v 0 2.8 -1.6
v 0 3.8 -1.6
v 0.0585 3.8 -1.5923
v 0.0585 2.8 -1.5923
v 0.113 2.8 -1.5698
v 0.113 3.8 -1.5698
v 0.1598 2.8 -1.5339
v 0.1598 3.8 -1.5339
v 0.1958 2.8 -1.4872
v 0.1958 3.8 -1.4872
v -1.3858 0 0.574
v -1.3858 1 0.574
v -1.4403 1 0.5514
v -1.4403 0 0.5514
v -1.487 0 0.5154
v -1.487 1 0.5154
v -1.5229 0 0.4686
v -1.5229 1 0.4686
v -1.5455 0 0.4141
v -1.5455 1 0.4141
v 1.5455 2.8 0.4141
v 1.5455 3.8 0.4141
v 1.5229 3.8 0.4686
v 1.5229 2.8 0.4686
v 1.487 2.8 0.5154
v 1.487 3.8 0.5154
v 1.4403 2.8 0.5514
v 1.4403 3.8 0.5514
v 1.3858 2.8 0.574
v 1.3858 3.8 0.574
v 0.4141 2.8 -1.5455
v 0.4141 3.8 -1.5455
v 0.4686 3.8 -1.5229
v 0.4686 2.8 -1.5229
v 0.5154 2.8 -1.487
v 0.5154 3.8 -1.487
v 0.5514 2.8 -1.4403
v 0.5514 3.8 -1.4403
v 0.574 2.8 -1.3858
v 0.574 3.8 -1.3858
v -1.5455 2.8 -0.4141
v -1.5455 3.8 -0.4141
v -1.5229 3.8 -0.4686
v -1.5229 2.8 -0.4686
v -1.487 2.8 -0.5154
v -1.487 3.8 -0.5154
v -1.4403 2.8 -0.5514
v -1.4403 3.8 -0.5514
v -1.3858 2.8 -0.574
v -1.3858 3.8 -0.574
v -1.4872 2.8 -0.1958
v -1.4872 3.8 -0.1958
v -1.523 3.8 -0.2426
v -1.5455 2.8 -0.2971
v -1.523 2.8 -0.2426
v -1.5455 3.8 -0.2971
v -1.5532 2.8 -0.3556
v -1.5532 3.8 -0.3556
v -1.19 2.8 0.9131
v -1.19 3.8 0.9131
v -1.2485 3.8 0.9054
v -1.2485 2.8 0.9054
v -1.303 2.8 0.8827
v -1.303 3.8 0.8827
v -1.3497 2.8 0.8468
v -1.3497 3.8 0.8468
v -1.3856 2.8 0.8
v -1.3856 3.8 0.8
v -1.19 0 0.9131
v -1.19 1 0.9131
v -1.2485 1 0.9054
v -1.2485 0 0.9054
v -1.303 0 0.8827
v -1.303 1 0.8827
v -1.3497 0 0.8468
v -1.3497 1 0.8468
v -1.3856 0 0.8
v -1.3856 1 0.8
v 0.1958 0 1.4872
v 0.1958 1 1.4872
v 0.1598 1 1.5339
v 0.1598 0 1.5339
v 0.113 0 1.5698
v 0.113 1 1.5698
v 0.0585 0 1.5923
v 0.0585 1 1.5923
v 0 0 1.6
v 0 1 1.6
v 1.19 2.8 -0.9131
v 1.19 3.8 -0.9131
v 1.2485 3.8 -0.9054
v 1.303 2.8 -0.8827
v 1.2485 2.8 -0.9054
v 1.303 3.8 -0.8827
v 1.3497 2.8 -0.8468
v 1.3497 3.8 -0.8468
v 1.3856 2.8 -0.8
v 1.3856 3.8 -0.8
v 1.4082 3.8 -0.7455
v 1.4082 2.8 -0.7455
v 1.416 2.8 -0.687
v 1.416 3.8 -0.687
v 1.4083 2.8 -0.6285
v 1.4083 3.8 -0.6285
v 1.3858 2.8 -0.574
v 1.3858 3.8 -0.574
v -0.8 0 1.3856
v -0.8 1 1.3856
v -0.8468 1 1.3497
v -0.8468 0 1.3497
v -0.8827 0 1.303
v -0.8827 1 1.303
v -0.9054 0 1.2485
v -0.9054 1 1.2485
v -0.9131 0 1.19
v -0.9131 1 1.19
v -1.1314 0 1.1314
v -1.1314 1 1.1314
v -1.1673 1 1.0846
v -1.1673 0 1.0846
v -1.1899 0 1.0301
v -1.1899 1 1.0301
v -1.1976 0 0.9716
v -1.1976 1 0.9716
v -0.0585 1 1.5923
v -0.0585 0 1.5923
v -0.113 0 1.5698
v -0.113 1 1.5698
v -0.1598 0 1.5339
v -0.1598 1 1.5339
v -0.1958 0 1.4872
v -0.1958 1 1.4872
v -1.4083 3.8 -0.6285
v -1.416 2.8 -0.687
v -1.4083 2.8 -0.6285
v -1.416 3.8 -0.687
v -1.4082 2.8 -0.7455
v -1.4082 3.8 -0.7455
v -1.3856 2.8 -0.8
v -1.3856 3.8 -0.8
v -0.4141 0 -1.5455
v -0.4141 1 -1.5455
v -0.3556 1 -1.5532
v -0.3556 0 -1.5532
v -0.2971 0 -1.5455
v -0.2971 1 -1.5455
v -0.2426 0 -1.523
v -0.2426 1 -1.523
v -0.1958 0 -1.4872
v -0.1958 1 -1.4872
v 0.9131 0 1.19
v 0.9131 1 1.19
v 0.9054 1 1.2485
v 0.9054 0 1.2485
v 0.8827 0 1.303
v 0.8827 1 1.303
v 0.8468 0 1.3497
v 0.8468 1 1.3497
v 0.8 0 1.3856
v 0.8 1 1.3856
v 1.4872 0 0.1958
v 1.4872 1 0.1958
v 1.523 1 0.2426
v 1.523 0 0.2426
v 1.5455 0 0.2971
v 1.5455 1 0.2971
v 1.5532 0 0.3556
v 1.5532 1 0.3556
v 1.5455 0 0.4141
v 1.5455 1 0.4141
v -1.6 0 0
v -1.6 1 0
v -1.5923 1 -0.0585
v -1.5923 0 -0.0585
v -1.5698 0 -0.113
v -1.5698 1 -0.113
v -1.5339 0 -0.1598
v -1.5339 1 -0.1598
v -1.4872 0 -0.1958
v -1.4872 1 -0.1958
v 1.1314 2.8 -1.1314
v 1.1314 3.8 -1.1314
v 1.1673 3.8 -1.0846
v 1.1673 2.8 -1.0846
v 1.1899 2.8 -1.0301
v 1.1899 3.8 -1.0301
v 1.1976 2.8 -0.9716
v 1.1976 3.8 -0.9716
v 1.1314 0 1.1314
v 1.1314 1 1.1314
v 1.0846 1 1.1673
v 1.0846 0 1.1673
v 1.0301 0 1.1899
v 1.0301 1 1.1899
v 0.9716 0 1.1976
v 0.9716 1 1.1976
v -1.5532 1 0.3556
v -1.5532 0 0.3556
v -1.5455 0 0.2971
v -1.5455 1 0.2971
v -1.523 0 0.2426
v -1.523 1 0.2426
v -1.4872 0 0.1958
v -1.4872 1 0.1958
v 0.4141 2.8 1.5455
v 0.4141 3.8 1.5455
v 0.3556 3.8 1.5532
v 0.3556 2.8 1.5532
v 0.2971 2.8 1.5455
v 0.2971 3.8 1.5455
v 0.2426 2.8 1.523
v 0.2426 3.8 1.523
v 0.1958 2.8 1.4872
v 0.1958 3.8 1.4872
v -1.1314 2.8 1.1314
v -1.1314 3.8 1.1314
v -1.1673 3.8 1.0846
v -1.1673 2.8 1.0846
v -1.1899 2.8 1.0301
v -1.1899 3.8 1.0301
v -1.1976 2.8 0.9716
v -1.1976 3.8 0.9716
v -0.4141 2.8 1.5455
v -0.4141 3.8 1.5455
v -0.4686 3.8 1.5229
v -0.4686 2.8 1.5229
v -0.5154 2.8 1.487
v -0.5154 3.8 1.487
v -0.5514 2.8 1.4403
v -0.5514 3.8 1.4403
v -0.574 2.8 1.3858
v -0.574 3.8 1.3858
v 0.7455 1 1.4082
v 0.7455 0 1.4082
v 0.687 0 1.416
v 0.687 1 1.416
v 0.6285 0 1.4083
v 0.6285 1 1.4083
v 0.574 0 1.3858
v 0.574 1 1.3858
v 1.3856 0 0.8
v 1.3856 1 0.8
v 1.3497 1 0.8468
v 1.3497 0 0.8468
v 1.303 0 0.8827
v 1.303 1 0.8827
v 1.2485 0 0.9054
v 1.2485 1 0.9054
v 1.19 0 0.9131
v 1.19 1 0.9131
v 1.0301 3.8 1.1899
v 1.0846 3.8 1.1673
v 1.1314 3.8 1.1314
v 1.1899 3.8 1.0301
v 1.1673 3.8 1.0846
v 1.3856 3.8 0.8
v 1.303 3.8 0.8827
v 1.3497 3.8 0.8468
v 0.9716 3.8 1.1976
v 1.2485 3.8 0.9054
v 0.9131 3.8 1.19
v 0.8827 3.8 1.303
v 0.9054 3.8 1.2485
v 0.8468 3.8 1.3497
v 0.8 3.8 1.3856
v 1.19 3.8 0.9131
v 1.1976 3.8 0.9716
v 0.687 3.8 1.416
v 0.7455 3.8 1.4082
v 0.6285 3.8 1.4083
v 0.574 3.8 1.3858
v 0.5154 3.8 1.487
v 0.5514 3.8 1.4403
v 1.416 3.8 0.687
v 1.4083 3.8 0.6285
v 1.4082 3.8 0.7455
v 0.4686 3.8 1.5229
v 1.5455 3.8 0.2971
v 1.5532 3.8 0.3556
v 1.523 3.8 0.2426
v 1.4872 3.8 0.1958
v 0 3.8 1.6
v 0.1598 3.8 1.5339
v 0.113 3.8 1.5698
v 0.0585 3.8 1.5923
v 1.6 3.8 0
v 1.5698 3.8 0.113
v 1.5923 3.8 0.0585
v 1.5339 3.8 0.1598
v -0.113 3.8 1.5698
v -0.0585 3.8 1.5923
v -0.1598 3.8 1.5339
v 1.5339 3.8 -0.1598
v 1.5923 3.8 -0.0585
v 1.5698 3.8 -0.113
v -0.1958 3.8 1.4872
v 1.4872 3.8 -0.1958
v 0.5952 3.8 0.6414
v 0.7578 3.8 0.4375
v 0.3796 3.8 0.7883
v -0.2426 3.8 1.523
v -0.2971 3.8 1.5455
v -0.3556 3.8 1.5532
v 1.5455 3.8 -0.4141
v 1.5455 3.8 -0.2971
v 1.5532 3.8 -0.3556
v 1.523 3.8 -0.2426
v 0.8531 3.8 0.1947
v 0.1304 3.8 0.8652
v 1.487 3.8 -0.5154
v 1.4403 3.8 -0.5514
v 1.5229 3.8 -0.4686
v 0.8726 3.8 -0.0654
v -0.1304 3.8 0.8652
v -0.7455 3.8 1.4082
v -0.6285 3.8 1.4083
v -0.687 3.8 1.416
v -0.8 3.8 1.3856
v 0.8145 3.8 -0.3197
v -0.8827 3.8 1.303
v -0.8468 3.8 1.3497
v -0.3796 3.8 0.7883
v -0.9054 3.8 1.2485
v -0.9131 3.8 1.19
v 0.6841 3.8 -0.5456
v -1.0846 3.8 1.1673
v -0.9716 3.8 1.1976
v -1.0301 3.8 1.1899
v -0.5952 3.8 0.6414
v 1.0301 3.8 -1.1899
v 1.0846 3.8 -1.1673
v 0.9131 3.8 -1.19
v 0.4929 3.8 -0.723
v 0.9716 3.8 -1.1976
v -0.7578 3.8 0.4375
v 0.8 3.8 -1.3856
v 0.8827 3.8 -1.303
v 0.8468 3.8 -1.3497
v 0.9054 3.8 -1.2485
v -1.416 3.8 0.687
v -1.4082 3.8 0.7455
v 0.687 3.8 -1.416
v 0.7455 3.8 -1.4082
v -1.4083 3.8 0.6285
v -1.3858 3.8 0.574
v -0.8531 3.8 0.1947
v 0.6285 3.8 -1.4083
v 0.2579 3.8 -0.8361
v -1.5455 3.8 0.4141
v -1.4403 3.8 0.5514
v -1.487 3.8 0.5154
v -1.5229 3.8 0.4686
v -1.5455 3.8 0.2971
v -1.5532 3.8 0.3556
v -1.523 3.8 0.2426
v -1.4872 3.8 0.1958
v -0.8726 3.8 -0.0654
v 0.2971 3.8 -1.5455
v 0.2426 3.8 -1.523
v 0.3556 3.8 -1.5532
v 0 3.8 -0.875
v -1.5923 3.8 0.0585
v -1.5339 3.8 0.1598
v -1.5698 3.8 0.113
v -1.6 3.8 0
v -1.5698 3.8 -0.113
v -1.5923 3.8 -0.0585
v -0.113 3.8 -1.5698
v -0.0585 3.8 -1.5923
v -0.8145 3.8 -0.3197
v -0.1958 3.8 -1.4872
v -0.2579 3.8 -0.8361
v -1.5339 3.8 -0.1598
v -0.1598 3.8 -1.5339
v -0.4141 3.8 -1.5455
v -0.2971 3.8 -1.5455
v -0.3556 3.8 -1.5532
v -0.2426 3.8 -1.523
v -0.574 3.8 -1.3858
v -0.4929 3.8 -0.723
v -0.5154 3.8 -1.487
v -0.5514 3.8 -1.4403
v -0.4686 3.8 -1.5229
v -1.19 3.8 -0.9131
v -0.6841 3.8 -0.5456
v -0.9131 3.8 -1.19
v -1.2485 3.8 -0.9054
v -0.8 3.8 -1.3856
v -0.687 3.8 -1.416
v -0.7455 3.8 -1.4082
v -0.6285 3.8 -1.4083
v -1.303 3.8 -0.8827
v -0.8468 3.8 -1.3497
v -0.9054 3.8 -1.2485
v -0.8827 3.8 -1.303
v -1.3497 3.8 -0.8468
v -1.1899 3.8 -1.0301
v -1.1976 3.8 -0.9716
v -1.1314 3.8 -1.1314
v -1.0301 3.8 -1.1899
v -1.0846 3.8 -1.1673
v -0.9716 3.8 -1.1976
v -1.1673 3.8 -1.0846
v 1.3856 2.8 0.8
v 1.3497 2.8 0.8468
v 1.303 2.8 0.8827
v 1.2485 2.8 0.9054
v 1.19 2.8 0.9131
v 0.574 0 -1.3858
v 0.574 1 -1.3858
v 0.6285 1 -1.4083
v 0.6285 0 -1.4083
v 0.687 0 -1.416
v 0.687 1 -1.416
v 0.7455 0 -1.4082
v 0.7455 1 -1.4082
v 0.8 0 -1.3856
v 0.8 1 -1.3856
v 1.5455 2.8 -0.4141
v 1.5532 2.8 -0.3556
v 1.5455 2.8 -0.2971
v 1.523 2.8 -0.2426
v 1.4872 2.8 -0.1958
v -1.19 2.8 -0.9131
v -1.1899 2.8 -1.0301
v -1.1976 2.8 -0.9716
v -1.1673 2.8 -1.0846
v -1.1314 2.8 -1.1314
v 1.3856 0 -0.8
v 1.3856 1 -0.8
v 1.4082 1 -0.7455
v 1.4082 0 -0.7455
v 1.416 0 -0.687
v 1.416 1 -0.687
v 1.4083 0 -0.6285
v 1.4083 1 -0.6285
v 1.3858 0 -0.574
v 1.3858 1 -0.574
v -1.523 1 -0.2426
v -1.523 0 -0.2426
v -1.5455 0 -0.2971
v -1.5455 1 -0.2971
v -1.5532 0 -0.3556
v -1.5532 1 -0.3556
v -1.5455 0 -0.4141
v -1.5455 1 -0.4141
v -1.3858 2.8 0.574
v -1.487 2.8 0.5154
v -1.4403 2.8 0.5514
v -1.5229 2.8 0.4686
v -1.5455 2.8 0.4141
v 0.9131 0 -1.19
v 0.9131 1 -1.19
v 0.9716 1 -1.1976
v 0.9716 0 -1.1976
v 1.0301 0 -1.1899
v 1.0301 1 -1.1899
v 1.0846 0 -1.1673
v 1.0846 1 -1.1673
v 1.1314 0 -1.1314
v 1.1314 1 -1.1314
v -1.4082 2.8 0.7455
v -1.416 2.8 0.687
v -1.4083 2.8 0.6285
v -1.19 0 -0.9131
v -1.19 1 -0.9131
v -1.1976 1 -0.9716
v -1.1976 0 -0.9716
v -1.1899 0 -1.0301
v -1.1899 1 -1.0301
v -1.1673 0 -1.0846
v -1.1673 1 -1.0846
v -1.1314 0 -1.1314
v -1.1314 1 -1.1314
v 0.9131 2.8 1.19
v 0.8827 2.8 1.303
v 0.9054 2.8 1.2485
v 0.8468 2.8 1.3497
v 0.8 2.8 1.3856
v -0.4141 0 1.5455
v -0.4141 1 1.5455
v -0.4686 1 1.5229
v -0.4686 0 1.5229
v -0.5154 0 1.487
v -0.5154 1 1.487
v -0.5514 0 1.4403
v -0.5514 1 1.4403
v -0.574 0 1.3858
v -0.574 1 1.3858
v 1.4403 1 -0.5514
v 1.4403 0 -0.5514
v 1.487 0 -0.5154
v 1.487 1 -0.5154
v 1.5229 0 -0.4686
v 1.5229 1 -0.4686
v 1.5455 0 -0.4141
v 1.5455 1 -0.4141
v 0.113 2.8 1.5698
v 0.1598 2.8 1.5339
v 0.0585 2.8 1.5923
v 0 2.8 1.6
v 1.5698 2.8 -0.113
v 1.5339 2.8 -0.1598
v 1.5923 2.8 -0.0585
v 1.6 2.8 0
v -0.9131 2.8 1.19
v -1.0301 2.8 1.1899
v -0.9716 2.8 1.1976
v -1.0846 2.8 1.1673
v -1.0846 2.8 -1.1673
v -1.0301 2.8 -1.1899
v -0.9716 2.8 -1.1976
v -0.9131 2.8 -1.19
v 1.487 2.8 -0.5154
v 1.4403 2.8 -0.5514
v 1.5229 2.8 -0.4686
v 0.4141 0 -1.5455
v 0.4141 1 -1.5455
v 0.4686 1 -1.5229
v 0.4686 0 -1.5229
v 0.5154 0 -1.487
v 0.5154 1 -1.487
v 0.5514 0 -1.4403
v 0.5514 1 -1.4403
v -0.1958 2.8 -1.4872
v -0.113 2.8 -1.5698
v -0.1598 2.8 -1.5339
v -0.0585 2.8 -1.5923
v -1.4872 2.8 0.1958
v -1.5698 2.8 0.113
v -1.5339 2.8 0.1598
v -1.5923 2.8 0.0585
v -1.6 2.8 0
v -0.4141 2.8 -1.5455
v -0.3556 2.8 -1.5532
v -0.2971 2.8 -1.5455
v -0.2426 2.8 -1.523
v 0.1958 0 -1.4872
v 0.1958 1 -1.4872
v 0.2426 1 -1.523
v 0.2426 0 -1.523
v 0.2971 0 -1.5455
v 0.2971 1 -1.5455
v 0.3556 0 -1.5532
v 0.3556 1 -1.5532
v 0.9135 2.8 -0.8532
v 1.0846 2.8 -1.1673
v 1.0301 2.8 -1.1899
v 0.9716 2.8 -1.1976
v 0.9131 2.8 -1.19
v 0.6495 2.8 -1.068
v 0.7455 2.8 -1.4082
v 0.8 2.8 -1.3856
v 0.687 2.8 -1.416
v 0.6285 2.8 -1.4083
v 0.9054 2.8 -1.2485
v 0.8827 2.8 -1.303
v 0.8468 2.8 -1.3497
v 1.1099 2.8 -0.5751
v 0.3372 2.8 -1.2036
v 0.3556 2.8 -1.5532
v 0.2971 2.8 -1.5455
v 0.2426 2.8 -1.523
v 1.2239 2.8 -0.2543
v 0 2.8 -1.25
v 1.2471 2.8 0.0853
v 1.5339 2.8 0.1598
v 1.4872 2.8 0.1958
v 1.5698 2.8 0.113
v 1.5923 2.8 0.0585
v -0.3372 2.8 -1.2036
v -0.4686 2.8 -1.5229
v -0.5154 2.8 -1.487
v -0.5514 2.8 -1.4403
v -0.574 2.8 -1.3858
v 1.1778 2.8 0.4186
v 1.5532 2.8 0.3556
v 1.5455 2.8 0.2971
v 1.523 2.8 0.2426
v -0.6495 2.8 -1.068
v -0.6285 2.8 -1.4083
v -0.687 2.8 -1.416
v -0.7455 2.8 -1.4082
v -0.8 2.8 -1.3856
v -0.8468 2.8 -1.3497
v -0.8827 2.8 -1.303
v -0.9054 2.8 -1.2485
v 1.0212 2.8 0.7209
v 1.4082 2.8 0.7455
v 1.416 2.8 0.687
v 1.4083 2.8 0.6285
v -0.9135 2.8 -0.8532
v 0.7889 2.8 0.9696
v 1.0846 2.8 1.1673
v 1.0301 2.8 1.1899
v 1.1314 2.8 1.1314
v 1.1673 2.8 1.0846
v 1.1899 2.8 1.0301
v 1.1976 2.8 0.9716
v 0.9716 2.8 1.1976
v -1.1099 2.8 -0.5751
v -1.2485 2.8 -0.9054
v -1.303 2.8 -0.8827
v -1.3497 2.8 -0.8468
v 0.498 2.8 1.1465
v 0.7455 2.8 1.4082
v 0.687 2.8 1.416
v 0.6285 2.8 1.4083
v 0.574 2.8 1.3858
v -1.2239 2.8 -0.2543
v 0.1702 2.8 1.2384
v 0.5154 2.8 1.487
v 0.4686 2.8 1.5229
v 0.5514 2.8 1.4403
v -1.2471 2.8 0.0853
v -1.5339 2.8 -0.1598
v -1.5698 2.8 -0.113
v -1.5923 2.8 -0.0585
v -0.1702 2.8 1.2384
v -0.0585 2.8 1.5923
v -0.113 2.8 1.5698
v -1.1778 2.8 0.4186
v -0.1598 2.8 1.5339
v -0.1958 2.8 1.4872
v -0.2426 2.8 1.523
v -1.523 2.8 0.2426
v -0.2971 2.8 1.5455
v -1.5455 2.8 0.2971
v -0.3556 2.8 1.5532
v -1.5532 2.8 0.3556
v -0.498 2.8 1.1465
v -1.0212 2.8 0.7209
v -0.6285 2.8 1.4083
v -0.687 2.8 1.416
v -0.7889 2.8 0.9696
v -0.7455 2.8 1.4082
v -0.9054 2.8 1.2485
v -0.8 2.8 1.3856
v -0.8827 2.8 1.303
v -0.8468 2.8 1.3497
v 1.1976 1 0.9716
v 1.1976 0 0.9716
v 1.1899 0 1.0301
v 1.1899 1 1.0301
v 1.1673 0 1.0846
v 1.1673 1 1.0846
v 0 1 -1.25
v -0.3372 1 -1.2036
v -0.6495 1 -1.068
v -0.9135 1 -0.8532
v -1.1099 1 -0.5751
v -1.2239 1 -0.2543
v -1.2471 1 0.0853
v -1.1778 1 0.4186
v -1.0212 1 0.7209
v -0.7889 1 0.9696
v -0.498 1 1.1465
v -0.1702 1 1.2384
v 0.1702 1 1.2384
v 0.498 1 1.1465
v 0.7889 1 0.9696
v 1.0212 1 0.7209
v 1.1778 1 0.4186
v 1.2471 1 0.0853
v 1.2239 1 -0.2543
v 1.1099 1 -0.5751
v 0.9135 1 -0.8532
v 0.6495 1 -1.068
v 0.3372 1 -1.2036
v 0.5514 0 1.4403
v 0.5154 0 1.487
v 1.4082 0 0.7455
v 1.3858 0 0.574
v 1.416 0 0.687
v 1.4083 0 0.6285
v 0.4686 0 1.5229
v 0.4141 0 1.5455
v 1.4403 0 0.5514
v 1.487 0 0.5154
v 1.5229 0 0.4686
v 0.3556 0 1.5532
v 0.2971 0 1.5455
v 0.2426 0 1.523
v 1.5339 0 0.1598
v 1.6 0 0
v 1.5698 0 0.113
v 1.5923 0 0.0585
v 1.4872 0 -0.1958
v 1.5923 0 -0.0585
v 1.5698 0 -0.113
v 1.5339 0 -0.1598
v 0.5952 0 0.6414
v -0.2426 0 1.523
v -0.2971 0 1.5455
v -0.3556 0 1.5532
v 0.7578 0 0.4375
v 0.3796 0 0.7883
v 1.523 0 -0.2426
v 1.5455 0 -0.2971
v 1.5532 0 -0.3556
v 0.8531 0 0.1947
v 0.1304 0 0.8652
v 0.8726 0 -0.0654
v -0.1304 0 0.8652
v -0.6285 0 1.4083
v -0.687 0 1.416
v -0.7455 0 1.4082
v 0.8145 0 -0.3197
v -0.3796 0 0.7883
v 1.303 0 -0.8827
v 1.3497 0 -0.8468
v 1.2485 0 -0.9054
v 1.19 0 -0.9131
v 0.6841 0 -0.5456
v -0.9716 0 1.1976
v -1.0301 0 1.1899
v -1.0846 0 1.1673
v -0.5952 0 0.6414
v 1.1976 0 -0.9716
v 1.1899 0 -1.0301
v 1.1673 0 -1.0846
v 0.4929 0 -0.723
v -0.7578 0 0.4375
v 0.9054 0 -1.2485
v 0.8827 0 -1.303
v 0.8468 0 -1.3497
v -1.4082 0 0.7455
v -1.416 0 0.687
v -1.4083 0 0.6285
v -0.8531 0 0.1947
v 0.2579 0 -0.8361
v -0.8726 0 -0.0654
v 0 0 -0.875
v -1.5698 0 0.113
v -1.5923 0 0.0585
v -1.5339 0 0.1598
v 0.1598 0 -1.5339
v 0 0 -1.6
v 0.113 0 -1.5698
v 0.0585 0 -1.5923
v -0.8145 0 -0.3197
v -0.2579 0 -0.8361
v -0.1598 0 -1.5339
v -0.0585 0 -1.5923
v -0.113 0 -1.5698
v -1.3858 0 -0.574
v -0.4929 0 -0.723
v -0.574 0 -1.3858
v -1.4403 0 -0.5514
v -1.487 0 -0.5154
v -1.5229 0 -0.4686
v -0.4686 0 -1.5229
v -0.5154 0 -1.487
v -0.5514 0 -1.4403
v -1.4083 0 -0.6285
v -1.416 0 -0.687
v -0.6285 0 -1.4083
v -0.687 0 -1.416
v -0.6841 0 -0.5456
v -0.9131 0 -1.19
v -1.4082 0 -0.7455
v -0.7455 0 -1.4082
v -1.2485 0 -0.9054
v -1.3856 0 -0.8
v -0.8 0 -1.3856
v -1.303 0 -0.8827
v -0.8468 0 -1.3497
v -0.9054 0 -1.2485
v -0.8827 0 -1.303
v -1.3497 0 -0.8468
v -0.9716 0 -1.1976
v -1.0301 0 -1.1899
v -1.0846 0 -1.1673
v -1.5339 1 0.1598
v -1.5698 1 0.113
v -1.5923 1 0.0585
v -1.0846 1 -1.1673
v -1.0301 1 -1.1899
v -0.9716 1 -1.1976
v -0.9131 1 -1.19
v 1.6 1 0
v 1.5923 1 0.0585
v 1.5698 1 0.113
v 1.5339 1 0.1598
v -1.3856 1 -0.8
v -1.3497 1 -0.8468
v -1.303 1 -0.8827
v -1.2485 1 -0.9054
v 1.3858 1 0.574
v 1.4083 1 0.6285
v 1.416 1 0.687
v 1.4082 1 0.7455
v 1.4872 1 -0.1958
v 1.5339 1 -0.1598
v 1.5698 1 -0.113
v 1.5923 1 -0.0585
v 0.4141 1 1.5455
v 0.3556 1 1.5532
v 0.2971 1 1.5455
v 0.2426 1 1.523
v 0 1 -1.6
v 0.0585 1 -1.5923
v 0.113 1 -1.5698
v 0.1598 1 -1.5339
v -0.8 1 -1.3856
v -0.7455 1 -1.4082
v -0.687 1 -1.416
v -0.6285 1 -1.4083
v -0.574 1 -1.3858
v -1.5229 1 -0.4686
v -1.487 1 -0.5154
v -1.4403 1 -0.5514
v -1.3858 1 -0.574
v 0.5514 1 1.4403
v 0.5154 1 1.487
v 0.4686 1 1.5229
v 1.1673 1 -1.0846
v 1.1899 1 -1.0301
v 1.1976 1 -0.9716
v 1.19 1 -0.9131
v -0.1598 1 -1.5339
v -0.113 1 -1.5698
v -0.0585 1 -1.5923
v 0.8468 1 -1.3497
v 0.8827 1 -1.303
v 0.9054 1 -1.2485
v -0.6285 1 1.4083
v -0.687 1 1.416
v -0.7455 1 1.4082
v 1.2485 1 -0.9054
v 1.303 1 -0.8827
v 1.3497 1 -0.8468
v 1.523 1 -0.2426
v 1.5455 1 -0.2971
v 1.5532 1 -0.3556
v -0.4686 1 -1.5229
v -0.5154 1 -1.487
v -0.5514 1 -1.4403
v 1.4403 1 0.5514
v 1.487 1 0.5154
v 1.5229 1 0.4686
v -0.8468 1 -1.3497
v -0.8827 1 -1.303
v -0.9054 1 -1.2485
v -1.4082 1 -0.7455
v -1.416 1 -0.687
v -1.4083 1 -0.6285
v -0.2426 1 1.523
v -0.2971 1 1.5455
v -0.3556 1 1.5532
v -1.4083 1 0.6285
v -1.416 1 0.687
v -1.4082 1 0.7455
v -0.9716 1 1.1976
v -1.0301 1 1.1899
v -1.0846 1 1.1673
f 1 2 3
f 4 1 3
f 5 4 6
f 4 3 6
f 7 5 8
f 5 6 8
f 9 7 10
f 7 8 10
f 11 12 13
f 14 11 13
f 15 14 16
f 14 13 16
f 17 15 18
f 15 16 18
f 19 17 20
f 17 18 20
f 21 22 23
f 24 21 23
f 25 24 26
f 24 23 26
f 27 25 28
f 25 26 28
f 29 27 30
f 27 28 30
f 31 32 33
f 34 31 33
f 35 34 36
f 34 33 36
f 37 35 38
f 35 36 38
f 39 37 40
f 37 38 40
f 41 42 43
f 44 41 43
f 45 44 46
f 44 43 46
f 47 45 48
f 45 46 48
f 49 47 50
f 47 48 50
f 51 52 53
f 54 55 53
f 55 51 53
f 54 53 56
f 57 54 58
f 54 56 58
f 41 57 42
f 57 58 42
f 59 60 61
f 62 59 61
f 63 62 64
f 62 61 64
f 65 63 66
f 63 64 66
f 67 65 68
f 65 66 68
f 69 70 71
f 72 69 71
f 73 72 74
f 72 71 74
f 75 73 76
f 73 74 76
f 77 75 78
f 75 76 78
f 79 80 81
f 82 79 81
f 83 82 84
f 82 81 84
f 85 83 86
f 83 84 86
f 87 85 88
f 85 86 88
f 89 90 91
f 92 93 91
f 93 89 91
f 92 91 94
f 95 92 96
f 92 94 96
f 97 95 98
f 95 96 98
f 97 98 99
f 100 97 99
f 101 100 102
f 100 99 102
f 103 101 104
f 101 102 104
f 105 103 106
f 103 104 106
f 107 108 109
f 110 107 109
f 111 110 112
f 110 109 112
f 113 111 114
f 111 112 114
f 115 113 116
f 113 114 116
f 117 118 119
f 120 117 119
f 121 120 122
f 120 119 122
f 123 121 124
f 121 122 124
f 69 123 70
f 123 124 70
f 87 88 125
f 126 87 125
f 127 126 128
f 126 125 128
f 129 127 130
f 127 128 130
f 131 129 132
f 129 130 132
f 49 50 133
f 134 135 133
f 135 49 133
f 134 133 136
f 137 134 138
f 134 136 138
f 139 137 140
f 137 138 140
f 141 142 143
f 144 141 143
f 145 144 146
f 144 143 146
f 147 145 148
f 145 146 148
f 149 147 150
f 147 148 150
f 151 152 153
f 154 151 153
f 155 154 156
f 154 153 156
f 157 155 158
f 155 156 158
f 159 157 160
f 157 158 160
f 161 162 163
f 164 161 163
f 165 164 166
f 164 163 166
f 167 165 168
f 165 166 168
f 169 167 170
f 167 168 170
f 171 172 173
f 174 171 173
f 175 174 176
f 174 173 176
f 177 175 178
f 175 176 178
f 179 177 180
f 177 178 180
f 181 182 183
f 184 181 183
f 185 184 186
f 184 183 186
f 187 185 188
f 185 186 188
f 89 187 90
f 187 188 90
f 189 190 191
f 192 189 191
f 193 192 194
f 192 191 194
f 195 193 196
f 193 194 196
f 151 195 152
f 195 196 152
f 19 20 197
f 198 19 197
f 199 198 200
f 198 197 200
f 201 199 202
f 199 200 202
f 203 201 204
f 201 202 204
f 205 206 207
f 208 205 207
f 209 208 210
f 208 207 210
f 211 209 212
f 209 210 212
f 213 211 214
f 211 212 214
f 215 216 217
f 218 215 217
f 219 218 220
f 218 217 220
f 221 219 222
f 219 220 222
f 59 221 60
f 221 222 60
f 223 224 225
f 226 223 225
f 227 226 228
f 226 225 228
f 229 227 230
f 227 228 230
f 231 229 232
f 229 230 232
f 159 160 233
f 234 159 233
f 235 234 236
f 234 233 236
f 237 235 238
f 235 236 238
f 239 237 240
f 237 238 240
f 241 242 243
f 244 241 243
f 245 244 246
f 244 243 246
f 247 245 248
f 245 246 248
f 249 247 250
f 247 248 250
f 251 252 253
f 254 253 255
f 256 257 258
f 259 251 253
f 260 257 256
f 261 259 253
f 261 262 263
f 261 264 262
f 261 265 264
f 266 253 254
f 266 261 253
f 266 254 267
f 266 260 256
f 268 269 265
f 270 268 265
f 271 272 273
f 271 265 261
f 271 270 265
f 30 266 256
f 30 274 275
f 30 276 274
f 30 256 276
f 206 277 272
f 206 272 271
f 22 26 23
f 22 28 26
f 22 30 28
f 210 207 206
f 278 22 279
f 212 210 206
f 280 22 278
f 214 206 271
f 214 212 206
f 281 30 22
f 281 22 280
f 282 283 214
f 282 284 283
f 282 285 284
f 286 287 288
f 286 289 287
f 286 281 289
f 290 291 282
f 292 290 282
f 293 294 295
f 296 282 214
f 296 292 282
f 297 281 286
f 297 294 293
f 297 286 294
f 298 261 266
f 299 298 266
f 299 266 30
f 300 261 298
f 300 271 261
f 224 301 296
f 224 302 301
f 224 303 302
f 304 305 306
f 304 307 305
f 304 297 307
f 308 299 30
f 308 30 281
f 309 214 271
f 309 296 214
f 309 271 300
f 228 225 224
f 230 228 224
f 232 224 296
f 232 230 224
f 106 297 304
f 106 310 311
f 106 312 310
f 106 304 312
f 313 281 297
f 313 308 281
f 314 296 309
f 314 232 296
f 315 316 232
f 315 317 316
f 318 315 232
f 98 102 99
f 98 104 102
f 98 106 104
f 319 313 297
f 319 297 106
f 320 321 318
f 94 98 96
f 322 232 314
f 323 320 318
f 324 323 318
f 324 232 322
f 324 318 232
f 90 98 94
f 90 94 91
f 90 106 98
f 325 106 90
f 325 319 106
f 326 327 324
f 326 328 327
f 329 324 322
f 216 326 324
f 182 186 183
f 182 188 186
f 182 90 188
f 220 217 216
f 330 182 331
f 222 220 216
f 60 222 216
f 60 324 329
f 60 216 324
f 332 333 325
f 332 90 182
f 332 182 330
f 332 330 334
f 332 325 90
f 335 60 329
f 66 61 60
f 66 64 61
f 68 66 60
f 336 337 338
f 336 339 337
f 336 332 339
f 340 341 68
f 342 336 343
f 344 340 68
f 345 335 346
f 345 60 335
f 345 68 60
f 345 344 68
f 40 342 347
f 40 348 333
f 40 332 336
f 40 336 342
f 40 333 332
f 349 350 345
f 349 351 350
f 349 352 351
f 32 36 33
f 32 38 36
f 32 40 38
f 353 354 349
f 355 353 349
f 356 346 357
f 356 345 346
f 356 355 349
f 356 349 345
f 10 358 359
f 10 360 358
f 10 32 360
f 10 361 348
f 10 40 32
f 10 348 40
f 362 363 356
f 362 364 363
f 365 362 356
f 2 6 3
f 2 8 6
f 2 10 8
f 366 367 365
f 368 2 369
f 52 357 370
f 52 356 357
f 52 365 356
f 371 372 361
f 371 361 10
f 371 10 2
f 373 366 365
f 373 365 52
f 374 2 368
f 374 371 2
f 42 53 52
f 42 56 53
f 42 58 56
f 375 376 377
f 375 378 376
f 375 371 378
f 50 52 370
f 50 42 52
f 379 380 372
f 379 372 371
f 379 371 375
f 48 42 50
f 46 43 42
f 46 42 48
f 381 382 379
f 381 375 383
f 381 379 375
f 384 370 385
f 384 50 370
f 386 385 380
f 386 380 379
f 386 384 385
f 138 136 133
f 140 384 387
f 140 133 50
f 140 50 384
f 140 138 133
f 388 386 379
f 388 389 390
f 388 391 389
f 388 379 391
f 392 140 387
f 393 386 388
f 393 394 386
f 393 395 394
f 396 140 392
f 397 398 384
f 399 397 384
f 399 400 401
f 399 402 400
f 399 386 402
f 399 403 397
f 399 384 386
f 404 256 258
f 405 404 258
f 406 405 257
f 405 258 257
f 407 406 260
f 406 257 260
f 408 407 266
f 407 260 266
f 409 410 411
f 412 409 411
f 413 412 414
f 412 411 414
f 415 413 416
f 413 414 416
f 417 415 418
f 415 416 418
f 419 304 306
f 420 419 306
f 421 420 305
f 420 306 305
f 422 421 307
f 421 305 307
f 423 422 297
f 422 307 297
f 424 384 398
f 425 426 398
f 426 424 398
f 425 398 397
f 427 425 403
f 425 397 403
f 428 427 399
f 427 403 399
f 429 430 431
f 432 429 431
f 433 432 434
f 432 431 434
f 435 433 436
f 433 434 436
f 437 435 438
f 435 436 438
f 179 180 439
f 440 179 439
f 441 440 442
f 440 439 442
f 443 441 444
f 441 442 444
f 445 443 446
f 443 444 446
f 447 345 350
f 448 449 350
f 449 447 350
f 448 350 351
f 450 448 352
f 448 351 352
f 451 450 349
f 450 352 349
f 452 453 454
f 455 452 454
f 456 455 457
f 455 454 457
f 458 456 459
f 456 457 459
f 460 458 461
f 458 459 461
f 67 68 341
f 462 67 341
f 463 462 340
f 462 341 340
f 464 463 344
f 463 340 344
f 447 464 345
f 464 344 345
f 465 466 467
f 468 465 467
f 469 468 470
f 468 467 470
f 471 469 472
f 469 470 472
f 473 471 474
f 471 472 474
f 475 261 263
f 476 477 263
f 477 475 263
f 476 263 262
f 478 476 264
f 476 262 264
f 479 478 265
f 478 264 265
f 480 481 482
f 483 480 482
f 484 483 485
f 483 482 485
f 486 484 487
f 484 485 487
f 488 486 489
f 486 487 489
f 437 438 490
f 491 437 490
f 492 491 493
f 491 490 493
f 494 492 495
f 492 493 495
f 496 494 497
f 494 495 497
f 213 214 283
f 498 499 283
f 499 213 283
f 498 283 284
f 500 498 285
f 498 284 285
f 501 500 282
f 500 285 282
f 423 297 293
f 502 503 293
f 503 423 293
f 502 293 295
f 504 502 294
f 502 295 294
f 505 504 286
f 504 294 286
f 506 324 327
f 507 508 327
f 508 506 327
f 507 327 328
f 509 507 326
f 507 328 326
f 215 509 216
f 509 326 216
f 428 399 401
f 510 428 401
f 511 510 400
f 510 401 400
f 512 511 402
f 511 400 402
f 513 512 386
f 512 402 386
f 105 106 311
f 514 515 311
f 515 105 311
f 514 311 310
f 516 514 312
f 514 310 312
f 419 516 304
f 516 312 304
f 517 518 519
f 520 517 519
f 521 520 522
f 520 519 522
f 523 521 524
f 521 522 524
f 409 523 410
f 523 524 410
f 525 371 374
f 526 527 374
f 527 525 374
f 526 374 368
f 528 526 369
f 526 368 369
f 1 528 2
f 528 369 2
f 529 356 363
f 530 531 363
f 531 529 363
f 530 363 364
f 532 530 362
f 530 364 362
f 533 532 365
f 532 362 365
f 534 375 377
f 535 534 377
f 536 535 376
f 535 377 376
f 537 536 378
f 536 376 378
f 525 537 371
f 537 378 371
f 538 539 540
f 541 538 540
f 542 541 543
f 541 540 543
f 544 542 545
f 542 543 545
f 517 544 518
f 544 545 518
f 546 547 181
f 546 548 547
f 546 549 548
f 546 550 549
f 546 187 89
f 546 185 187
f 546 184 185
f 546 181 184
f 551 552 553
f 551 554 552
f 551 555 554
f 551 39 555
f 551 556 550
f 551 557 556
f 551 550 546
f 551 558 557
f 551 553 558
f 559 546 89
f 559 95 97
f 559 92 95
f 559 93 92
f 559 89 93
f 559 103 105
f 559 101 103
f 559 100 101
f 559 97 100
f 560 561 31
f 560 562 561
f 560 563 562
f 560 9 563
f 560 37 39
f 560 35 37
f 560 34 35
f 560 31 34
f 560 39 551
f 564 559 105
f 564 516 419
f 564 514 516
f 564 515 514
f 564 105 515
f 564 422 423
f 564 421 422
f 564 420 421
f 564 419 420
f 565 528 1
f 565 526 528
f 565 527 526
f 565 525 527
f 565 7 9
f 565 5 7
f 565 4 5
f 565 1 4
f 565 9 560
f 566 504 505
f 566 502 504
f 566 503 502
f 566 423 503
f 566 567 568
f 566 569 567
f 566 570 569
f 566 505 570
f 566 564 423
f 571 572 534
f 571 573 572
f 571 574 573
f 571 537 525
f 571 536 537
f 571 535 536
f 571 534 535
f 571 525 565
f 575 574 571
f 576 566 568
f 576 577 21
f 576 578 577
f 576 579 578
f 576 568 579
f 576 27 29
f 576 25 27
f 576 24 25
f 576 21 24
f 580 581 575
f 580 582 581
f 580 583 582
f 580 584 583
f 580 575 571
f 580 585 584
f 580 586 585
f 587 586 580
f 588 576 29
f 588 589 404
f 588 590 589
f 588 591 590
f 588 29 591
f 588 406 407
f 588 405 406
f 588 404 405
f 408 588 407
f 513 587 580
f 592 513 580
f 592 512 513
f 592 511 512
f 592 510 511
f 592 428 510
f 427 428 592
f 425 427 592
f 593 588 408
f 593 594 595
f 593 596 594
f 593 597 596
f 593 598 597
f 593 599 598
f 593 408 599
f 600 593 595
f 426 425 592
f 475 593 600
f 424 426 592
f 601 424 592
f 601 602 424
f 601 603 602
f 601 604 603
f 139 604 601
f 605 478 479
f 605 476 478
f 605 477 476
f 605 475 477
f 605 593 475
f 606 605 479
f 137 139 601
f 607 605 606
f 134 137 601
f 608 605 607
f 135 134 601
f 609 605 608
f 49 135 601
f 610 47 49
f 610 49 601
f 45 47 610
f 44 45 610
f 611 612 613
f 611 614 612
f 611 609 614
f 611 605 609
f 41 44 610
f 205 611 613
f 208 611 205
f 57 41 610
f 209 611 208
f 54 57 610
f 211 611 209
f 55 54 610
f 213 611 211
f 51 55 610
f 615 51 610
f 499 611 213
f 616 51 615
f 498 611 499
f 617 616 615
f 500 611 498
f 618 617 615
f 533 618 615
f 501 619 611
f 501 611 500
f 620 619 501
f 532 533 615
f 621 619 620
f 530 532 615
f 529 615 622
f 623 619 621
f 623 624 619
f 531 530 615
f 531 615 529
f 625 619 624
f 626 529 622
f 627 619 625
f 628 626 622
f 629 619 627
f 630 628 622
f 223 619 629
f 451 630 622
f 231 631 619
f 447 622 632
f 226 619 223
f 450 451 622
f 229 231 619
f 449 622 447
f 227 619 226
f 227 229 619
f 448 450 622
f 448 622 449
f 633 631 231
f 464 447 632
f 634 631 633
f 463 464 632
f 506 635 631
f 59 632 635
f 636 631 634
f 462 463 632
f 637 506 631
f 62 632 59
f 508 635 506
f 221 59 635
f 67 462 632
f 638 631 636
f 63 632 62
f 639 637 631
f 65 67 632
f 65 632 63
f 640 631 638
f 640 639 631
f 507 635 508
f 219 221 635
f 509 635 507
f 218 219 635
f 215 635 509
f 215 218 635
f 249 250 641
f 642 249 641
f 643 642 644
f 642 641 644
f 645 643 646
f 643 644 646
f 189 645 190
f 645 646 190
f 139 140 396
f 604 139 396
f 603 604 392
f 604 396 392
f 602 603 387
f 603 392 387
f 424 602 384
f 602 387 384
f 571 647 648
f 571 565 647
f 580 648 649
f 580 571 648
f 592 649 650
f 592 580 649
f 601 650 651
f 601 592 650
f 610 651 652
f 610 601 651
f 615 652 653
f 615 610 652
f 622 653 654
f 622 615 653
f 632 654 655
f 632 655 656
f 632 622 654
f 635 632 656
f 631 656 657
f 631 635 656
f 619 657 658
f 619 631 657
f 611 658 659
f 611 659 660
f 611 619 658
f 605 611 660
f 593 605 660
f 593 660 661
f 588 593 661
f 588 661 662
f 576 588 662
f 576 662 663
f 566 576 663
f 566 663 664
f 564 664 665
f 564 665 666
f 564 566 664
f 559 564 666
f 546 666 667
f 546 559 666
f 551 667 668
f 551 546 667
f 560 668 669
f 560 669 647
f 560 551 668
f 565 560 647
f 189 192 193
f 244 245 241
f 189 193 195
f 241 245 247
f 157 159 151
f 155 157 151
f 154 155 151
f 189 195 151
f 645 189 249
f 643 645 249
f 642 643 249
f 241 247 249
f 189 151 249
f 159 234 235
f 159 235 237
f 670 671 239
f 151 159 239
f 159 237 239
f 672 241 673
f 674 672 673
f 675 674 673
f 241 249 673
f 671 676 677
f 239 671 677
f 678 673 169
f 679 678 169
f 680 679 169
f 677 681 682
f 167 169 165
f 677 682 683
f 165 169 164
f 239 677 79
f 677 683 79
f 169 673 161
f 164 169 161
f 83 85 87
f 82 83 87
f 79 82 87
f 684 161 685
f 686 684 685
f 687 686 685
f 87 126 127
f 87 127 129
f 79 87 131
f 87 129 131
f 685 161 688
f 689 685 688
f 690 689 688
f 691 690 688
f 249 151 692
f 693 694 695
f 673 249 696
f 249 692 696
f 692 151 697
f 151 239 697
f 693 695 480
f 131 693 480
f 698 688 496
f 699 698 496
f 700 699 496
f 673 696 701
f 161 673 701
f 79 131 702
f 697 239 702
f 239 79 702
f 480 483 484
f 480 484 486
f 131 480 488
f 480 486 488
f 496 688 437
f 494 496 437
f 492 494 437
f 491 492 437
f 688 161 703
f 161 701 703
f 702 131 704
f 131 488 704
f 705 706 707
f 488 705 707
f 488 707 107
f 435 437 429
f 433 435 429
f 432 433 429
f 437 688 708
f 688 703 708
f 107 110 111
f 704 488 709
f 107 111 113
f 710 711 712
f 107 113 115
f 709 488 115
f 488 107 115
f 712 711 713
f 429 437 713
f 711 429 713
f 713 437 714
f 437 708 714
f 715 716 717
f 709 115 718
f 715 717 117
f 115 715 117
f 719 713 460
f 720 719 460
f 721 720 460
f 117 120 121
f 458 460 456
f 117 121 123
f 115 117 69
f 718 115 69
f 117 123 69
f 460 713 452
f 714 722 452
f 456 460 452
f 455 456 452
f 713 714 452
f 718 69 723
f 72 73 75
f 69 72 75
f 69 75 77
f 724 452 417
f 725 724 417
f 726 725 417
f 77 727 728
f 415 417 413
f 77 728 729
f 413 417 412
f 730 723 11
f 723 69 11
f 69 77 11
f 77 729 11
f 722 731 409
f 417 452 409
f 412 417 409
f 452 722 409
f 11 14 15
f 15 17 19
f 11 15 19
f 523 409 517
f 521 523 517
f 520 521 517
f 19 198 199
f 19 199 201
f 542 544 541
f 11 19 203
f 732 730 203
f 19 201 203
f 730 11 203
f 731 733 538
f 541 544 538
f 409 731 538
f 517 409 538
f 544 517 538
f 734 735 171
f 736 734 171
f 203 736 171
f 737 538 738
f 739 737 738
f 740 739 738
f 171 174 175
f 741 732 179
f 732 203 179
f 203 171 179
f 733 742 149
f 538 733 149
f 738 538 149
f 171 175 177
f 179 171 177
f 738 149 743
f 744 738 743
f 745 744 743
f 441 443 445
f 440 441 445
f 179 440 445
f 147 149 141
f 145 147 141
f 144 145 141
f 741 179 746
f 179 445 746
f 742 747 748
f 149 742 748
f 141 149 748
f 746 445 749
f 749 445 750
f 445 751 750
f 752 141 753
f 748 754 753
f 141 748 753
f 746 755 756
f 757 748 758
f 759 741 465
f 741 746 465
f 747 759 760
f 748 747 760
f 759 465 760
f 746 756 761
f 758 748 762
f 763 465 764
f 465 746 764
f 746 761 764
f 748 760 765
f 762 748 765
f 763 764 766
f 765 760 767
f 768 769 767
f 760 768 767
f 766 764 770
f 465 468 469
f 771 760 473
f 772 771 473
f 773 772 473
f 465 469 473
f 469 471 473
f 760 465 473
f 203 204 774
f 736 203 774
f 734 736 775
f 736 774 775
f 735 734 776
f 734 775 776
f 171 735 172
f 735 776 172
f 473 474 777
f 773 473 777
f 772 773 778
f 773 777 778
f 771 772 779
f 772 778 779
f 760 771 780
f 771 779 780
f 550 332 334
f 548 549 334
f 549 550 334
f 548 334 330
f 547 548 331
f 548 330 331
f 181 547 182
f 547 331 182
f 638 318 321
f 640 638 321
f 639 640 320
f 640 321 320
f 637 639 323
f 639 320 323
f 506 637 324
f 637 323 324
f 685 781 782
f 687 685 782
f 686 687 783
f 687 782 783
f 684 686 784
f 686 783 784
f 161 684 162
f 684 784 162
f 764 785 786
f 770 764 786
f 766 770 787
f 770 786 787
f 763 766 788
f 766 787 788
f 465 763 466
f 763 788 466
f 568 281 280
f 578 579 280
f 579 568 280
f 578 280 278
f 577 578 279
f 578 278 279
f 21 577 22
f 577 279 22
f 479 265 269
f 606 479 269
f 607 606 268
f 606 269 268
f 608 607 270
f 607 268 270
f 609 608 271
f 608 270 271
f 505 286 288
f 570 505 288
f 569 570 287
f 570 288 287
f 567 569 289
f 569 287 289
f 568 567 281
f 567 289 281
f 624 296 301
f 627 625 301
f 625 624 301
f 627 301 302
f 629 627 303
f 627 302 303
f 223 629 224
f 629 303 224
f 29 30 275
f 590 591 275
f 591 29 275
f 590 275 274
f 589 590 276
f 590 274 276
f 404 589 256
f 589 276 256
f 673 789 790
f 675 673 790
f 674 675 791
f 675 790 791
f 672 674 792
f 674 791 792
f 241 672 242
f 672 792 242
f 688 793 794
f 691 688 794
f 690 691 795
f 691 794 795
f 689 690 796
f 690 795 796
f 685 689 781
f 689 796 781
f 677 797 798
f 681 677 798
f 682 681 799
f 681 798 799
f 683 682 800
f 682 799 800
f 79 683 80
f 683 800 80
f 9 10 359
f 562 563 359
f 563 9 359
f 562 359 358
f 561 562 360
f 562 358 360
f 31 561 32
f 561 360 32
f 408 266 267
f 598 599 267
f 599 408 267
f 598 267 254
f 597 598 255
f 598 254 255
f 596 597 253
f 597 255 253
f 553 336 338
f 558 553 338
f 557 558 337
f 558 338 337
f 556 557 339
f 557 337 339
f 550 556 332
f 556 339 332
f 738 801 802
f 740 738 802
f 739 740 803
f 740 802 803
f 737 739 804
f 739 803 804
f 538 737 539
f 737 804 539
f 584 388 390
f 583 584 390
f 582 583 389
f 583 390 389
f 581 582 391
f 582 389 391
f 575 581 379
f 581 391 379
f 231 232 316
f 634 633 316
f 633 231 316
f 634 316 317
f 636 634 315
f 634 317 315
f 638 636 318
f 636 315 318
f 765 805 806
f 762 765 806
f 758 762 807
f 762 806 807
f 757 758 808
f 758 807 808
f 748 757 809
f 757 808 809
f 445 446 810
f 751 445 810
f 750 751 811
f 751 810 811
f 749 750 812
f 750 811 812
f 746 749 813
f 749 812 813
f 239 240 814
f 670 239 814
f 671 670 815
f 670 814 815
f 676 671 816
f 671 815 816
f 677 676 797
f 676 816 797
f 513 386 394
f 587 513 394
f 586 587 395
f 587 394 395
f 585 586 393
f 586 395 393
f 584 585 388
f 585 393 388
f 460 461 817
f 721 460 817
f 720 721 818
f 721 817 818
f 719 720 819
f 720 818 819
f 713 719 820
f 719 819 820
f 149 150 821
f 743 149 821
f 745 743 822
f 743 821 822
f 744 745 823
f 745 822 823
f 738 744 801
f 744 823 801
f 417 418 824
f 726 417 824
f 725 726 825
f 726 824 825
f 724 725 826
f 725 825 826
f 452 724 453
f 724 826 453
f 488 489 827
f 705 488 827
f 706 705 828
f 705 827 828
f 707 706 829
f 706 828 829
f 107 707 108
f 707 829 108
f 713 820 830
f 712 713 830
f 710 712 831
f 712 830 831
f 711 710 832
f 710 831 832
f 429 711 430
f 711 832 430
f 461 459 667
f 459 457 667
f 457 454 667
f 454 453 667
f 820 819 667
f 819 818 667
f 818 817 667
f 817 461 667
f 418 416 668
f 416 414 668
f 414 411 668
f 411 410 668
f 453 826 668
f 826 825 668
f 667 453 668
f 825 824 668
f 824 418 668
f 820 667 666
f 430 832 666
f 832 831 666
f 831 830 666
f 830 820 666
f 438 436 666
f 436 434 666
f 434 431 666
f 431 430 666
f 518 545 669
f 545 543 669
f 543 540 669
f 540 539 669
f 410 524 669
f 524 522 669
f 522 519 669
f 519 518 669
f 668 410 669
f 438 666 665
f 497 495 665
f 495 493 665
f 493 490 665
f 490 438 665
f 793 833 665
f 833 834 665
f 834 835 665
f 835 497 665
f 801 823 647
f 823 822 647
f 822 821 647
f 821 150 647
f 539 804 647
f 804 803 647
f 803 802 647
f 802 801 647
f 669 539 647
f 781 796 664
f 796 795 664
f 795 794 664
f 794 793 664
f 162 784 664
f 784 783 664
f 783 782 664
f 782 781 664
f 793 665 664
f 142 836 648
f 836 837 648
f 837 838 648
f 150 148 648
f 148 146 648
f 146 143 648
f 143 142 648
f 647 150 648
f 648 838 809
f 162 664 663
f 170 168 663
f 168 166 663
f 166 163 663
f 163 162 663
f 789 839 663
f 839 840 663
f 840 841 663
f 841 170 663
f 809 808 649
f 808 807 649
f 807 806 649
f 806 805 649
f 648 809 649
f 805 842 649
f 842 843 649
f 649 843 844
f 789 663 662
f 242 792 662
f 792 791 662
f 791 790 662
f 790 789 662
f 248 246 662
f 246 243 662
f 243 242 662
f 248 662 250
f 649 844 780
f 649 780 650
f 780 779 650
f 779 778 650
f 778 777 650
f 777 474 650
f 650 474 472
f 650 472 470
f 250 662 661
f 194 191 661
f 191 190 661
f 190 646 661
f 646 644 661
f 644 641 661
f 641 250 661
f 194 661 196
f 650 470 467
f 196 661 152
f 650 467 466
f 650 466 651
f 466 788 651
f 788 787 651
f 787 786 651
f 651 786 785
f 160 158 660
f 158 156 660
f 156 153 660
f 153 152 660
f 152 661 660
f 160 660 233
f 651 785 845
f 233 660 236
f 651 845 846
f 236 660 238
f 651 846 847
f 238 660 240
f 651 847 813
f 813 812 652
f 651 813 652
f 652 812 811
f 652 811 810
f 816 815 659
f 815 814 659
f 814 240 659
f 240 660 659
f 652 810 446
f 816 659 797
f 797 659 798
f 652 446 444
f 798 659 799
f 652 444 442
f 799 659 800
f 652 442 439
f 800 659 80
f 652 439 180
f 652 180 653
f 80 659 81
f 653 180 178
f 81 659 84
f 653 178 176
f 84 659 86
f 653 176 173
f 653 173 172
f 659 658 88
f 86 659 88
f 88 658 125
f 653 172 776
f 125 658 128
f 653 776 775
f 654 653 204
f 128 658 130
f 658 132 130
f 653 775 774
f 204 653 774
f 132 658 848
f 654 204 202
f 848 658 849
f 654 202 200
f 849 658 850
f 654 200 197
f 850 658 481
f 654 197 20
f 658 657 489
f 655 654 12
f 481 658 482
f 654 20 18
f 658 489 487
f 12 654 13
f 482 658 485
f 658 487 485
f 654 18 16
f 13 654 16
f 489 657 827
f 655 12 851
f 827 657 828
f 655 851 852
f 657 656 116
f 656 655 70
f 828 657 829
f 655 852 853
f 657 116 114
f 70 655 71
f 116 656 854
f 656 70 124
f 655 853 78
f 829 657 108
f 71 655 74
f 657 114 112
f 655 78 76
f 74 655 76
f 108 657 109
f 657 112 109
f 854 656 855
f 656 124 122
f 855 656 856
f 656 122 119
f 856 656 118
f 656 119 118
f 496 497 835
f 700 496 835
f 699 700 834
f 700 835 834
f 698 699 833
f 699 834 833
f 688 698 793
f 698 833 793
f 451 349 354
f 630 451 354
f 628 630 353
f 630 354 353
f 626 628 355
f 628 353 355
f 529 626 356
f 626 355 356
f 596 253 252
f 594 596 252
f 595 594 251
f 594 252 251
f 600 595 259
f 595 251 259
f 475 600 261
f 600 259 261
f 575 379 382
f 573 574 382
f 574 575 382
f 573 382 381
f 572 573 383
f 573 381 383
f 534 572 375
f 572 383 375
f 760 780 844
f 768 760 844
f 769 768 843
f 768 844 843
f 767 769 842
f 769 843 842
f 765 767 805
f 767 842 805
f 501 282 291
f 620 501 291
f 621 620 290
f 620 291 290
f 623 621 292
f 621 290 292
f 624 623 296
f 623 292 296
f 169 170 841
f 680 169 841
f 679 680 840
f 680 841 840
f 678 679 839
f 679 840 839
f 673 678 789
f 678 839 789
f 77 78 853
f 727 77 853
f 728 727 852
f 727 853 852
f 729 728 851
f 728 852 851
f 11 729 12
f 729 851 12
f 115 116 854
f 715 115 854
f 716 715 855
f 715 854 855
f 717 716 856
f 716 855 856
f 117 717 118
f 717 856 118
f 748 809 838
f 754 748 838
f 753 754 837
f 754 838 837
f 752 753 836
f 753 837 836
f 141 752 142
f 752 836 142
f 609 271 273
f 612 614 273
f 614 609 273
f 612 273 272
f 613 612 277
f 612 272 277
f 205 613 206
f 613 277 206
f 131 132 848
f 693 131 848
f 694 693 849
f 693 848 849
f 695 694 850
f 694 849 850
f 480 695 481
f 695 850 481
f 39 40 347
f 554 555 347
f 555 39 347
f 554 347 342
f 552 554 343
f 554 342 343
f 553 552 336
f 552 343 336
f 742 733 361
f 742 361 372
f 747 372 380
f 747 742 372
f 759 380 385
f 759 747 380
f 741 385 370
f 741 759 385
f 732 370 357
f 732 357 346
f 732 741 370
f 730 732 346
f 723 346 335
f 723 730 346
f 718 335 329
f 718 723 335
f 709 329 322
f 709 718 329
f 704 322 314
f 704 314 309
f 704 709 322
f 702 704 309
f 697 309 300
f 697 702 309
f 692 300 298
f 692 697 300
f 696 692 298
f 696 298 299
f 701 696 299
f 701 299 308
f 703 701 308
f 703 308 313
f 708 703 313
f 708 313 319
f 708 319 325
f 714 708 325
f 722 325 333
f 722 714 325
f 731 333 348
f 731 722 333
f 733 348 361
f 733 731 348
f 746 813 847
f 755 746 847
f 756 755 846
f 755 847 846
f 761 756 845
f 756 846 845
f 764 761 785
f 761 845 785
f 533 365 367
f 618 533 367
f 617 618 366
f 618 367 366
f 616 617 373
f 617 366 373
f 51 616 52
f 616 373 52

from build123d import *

# Parameters (mm, degrees)
SKETCH1_R           = 1.6
SKETCH1_R_2         = 0.875
BOSS_EXTRUDE1_DEPTH = 3.8
SKETCH2_W           = 0.35
SKETCH2_H           = 1.8
CUT_EXTRUDE1_DEPTH  = 5.422668877
CIRPATTERN1_COUNT   = 24


with BuildPart() as part:
    # Sketch1 → Boss-Extrude1 (new body)
    with BuildSketch(Plane(origin=(0, 0, 0), x_dir=(1, 0, 0), z_dir=(0, 1, 0))):
        with Locations(Location((0, 0, 0), (0, 0, 90))):
            Circle(SKETCH1_R)
        with Locations(Location((0, 0, 0), (0, 0, 90))):
            Circle(SKETCH1_R_2, mode=Mode.SUBTRACT)
    extrude(amount=BOSS_EXTRUDE1_DEPTH)

    # Sketch2 → Cut-Revolve1 (revolve, cut)
    with BuildSketch(Plane(origin=(0, 0, 0), x_dir=(0, 0, -1), z_dir=(1, 0, 0))):
        with Locations((1.425, 1.9)):
            Rectangle(SKETCH2_W, SKETCH2_H)
    revolve(axis=Axis((0, 0, 0), (0, 1, 0)), mode=Mode.SUBTRACT)

    # Sketch3 → Cut-Extrude1 (cut, through all)
    with BuildSketch(Plane(origin=(0, 3.8, 0), x_dir=(1, 0, 0), z_dir=(0, 1, 0))):
        with BuildLine():
            ThreePointArc((0, 1.6), (0.112987461, 1.569772966), (0.195789288, 1.487167292))
            ThreePointArc((0.195789288, 1.487167292), (0.297149633, 1.545527556), (0.414110472, 1.545481322))
            ThreePointArc((0.414110472, 1.545481322), (0.208841908, 1.586311778), (0, 1.6))
        make_face()
    cut_extrude1 = extrude(amount=-CUT_EXTRUDE1_DEPTH, mode=Mode.SUBTRACT)

    # CirPattern1: Cut-Extrude1 ×24 about axis
    cirpattern1_axis = Axis((0, 0, 0), (0, 1, 0))
    for i in range(1, CIRPATTERN1_COUNT):
        add(cut_extrude1.rotate(cirpattern1_axis, i * 360 / CIRPATTERN1_COUNT), mode=Mode.SUBTRACT)


solid = part.part
